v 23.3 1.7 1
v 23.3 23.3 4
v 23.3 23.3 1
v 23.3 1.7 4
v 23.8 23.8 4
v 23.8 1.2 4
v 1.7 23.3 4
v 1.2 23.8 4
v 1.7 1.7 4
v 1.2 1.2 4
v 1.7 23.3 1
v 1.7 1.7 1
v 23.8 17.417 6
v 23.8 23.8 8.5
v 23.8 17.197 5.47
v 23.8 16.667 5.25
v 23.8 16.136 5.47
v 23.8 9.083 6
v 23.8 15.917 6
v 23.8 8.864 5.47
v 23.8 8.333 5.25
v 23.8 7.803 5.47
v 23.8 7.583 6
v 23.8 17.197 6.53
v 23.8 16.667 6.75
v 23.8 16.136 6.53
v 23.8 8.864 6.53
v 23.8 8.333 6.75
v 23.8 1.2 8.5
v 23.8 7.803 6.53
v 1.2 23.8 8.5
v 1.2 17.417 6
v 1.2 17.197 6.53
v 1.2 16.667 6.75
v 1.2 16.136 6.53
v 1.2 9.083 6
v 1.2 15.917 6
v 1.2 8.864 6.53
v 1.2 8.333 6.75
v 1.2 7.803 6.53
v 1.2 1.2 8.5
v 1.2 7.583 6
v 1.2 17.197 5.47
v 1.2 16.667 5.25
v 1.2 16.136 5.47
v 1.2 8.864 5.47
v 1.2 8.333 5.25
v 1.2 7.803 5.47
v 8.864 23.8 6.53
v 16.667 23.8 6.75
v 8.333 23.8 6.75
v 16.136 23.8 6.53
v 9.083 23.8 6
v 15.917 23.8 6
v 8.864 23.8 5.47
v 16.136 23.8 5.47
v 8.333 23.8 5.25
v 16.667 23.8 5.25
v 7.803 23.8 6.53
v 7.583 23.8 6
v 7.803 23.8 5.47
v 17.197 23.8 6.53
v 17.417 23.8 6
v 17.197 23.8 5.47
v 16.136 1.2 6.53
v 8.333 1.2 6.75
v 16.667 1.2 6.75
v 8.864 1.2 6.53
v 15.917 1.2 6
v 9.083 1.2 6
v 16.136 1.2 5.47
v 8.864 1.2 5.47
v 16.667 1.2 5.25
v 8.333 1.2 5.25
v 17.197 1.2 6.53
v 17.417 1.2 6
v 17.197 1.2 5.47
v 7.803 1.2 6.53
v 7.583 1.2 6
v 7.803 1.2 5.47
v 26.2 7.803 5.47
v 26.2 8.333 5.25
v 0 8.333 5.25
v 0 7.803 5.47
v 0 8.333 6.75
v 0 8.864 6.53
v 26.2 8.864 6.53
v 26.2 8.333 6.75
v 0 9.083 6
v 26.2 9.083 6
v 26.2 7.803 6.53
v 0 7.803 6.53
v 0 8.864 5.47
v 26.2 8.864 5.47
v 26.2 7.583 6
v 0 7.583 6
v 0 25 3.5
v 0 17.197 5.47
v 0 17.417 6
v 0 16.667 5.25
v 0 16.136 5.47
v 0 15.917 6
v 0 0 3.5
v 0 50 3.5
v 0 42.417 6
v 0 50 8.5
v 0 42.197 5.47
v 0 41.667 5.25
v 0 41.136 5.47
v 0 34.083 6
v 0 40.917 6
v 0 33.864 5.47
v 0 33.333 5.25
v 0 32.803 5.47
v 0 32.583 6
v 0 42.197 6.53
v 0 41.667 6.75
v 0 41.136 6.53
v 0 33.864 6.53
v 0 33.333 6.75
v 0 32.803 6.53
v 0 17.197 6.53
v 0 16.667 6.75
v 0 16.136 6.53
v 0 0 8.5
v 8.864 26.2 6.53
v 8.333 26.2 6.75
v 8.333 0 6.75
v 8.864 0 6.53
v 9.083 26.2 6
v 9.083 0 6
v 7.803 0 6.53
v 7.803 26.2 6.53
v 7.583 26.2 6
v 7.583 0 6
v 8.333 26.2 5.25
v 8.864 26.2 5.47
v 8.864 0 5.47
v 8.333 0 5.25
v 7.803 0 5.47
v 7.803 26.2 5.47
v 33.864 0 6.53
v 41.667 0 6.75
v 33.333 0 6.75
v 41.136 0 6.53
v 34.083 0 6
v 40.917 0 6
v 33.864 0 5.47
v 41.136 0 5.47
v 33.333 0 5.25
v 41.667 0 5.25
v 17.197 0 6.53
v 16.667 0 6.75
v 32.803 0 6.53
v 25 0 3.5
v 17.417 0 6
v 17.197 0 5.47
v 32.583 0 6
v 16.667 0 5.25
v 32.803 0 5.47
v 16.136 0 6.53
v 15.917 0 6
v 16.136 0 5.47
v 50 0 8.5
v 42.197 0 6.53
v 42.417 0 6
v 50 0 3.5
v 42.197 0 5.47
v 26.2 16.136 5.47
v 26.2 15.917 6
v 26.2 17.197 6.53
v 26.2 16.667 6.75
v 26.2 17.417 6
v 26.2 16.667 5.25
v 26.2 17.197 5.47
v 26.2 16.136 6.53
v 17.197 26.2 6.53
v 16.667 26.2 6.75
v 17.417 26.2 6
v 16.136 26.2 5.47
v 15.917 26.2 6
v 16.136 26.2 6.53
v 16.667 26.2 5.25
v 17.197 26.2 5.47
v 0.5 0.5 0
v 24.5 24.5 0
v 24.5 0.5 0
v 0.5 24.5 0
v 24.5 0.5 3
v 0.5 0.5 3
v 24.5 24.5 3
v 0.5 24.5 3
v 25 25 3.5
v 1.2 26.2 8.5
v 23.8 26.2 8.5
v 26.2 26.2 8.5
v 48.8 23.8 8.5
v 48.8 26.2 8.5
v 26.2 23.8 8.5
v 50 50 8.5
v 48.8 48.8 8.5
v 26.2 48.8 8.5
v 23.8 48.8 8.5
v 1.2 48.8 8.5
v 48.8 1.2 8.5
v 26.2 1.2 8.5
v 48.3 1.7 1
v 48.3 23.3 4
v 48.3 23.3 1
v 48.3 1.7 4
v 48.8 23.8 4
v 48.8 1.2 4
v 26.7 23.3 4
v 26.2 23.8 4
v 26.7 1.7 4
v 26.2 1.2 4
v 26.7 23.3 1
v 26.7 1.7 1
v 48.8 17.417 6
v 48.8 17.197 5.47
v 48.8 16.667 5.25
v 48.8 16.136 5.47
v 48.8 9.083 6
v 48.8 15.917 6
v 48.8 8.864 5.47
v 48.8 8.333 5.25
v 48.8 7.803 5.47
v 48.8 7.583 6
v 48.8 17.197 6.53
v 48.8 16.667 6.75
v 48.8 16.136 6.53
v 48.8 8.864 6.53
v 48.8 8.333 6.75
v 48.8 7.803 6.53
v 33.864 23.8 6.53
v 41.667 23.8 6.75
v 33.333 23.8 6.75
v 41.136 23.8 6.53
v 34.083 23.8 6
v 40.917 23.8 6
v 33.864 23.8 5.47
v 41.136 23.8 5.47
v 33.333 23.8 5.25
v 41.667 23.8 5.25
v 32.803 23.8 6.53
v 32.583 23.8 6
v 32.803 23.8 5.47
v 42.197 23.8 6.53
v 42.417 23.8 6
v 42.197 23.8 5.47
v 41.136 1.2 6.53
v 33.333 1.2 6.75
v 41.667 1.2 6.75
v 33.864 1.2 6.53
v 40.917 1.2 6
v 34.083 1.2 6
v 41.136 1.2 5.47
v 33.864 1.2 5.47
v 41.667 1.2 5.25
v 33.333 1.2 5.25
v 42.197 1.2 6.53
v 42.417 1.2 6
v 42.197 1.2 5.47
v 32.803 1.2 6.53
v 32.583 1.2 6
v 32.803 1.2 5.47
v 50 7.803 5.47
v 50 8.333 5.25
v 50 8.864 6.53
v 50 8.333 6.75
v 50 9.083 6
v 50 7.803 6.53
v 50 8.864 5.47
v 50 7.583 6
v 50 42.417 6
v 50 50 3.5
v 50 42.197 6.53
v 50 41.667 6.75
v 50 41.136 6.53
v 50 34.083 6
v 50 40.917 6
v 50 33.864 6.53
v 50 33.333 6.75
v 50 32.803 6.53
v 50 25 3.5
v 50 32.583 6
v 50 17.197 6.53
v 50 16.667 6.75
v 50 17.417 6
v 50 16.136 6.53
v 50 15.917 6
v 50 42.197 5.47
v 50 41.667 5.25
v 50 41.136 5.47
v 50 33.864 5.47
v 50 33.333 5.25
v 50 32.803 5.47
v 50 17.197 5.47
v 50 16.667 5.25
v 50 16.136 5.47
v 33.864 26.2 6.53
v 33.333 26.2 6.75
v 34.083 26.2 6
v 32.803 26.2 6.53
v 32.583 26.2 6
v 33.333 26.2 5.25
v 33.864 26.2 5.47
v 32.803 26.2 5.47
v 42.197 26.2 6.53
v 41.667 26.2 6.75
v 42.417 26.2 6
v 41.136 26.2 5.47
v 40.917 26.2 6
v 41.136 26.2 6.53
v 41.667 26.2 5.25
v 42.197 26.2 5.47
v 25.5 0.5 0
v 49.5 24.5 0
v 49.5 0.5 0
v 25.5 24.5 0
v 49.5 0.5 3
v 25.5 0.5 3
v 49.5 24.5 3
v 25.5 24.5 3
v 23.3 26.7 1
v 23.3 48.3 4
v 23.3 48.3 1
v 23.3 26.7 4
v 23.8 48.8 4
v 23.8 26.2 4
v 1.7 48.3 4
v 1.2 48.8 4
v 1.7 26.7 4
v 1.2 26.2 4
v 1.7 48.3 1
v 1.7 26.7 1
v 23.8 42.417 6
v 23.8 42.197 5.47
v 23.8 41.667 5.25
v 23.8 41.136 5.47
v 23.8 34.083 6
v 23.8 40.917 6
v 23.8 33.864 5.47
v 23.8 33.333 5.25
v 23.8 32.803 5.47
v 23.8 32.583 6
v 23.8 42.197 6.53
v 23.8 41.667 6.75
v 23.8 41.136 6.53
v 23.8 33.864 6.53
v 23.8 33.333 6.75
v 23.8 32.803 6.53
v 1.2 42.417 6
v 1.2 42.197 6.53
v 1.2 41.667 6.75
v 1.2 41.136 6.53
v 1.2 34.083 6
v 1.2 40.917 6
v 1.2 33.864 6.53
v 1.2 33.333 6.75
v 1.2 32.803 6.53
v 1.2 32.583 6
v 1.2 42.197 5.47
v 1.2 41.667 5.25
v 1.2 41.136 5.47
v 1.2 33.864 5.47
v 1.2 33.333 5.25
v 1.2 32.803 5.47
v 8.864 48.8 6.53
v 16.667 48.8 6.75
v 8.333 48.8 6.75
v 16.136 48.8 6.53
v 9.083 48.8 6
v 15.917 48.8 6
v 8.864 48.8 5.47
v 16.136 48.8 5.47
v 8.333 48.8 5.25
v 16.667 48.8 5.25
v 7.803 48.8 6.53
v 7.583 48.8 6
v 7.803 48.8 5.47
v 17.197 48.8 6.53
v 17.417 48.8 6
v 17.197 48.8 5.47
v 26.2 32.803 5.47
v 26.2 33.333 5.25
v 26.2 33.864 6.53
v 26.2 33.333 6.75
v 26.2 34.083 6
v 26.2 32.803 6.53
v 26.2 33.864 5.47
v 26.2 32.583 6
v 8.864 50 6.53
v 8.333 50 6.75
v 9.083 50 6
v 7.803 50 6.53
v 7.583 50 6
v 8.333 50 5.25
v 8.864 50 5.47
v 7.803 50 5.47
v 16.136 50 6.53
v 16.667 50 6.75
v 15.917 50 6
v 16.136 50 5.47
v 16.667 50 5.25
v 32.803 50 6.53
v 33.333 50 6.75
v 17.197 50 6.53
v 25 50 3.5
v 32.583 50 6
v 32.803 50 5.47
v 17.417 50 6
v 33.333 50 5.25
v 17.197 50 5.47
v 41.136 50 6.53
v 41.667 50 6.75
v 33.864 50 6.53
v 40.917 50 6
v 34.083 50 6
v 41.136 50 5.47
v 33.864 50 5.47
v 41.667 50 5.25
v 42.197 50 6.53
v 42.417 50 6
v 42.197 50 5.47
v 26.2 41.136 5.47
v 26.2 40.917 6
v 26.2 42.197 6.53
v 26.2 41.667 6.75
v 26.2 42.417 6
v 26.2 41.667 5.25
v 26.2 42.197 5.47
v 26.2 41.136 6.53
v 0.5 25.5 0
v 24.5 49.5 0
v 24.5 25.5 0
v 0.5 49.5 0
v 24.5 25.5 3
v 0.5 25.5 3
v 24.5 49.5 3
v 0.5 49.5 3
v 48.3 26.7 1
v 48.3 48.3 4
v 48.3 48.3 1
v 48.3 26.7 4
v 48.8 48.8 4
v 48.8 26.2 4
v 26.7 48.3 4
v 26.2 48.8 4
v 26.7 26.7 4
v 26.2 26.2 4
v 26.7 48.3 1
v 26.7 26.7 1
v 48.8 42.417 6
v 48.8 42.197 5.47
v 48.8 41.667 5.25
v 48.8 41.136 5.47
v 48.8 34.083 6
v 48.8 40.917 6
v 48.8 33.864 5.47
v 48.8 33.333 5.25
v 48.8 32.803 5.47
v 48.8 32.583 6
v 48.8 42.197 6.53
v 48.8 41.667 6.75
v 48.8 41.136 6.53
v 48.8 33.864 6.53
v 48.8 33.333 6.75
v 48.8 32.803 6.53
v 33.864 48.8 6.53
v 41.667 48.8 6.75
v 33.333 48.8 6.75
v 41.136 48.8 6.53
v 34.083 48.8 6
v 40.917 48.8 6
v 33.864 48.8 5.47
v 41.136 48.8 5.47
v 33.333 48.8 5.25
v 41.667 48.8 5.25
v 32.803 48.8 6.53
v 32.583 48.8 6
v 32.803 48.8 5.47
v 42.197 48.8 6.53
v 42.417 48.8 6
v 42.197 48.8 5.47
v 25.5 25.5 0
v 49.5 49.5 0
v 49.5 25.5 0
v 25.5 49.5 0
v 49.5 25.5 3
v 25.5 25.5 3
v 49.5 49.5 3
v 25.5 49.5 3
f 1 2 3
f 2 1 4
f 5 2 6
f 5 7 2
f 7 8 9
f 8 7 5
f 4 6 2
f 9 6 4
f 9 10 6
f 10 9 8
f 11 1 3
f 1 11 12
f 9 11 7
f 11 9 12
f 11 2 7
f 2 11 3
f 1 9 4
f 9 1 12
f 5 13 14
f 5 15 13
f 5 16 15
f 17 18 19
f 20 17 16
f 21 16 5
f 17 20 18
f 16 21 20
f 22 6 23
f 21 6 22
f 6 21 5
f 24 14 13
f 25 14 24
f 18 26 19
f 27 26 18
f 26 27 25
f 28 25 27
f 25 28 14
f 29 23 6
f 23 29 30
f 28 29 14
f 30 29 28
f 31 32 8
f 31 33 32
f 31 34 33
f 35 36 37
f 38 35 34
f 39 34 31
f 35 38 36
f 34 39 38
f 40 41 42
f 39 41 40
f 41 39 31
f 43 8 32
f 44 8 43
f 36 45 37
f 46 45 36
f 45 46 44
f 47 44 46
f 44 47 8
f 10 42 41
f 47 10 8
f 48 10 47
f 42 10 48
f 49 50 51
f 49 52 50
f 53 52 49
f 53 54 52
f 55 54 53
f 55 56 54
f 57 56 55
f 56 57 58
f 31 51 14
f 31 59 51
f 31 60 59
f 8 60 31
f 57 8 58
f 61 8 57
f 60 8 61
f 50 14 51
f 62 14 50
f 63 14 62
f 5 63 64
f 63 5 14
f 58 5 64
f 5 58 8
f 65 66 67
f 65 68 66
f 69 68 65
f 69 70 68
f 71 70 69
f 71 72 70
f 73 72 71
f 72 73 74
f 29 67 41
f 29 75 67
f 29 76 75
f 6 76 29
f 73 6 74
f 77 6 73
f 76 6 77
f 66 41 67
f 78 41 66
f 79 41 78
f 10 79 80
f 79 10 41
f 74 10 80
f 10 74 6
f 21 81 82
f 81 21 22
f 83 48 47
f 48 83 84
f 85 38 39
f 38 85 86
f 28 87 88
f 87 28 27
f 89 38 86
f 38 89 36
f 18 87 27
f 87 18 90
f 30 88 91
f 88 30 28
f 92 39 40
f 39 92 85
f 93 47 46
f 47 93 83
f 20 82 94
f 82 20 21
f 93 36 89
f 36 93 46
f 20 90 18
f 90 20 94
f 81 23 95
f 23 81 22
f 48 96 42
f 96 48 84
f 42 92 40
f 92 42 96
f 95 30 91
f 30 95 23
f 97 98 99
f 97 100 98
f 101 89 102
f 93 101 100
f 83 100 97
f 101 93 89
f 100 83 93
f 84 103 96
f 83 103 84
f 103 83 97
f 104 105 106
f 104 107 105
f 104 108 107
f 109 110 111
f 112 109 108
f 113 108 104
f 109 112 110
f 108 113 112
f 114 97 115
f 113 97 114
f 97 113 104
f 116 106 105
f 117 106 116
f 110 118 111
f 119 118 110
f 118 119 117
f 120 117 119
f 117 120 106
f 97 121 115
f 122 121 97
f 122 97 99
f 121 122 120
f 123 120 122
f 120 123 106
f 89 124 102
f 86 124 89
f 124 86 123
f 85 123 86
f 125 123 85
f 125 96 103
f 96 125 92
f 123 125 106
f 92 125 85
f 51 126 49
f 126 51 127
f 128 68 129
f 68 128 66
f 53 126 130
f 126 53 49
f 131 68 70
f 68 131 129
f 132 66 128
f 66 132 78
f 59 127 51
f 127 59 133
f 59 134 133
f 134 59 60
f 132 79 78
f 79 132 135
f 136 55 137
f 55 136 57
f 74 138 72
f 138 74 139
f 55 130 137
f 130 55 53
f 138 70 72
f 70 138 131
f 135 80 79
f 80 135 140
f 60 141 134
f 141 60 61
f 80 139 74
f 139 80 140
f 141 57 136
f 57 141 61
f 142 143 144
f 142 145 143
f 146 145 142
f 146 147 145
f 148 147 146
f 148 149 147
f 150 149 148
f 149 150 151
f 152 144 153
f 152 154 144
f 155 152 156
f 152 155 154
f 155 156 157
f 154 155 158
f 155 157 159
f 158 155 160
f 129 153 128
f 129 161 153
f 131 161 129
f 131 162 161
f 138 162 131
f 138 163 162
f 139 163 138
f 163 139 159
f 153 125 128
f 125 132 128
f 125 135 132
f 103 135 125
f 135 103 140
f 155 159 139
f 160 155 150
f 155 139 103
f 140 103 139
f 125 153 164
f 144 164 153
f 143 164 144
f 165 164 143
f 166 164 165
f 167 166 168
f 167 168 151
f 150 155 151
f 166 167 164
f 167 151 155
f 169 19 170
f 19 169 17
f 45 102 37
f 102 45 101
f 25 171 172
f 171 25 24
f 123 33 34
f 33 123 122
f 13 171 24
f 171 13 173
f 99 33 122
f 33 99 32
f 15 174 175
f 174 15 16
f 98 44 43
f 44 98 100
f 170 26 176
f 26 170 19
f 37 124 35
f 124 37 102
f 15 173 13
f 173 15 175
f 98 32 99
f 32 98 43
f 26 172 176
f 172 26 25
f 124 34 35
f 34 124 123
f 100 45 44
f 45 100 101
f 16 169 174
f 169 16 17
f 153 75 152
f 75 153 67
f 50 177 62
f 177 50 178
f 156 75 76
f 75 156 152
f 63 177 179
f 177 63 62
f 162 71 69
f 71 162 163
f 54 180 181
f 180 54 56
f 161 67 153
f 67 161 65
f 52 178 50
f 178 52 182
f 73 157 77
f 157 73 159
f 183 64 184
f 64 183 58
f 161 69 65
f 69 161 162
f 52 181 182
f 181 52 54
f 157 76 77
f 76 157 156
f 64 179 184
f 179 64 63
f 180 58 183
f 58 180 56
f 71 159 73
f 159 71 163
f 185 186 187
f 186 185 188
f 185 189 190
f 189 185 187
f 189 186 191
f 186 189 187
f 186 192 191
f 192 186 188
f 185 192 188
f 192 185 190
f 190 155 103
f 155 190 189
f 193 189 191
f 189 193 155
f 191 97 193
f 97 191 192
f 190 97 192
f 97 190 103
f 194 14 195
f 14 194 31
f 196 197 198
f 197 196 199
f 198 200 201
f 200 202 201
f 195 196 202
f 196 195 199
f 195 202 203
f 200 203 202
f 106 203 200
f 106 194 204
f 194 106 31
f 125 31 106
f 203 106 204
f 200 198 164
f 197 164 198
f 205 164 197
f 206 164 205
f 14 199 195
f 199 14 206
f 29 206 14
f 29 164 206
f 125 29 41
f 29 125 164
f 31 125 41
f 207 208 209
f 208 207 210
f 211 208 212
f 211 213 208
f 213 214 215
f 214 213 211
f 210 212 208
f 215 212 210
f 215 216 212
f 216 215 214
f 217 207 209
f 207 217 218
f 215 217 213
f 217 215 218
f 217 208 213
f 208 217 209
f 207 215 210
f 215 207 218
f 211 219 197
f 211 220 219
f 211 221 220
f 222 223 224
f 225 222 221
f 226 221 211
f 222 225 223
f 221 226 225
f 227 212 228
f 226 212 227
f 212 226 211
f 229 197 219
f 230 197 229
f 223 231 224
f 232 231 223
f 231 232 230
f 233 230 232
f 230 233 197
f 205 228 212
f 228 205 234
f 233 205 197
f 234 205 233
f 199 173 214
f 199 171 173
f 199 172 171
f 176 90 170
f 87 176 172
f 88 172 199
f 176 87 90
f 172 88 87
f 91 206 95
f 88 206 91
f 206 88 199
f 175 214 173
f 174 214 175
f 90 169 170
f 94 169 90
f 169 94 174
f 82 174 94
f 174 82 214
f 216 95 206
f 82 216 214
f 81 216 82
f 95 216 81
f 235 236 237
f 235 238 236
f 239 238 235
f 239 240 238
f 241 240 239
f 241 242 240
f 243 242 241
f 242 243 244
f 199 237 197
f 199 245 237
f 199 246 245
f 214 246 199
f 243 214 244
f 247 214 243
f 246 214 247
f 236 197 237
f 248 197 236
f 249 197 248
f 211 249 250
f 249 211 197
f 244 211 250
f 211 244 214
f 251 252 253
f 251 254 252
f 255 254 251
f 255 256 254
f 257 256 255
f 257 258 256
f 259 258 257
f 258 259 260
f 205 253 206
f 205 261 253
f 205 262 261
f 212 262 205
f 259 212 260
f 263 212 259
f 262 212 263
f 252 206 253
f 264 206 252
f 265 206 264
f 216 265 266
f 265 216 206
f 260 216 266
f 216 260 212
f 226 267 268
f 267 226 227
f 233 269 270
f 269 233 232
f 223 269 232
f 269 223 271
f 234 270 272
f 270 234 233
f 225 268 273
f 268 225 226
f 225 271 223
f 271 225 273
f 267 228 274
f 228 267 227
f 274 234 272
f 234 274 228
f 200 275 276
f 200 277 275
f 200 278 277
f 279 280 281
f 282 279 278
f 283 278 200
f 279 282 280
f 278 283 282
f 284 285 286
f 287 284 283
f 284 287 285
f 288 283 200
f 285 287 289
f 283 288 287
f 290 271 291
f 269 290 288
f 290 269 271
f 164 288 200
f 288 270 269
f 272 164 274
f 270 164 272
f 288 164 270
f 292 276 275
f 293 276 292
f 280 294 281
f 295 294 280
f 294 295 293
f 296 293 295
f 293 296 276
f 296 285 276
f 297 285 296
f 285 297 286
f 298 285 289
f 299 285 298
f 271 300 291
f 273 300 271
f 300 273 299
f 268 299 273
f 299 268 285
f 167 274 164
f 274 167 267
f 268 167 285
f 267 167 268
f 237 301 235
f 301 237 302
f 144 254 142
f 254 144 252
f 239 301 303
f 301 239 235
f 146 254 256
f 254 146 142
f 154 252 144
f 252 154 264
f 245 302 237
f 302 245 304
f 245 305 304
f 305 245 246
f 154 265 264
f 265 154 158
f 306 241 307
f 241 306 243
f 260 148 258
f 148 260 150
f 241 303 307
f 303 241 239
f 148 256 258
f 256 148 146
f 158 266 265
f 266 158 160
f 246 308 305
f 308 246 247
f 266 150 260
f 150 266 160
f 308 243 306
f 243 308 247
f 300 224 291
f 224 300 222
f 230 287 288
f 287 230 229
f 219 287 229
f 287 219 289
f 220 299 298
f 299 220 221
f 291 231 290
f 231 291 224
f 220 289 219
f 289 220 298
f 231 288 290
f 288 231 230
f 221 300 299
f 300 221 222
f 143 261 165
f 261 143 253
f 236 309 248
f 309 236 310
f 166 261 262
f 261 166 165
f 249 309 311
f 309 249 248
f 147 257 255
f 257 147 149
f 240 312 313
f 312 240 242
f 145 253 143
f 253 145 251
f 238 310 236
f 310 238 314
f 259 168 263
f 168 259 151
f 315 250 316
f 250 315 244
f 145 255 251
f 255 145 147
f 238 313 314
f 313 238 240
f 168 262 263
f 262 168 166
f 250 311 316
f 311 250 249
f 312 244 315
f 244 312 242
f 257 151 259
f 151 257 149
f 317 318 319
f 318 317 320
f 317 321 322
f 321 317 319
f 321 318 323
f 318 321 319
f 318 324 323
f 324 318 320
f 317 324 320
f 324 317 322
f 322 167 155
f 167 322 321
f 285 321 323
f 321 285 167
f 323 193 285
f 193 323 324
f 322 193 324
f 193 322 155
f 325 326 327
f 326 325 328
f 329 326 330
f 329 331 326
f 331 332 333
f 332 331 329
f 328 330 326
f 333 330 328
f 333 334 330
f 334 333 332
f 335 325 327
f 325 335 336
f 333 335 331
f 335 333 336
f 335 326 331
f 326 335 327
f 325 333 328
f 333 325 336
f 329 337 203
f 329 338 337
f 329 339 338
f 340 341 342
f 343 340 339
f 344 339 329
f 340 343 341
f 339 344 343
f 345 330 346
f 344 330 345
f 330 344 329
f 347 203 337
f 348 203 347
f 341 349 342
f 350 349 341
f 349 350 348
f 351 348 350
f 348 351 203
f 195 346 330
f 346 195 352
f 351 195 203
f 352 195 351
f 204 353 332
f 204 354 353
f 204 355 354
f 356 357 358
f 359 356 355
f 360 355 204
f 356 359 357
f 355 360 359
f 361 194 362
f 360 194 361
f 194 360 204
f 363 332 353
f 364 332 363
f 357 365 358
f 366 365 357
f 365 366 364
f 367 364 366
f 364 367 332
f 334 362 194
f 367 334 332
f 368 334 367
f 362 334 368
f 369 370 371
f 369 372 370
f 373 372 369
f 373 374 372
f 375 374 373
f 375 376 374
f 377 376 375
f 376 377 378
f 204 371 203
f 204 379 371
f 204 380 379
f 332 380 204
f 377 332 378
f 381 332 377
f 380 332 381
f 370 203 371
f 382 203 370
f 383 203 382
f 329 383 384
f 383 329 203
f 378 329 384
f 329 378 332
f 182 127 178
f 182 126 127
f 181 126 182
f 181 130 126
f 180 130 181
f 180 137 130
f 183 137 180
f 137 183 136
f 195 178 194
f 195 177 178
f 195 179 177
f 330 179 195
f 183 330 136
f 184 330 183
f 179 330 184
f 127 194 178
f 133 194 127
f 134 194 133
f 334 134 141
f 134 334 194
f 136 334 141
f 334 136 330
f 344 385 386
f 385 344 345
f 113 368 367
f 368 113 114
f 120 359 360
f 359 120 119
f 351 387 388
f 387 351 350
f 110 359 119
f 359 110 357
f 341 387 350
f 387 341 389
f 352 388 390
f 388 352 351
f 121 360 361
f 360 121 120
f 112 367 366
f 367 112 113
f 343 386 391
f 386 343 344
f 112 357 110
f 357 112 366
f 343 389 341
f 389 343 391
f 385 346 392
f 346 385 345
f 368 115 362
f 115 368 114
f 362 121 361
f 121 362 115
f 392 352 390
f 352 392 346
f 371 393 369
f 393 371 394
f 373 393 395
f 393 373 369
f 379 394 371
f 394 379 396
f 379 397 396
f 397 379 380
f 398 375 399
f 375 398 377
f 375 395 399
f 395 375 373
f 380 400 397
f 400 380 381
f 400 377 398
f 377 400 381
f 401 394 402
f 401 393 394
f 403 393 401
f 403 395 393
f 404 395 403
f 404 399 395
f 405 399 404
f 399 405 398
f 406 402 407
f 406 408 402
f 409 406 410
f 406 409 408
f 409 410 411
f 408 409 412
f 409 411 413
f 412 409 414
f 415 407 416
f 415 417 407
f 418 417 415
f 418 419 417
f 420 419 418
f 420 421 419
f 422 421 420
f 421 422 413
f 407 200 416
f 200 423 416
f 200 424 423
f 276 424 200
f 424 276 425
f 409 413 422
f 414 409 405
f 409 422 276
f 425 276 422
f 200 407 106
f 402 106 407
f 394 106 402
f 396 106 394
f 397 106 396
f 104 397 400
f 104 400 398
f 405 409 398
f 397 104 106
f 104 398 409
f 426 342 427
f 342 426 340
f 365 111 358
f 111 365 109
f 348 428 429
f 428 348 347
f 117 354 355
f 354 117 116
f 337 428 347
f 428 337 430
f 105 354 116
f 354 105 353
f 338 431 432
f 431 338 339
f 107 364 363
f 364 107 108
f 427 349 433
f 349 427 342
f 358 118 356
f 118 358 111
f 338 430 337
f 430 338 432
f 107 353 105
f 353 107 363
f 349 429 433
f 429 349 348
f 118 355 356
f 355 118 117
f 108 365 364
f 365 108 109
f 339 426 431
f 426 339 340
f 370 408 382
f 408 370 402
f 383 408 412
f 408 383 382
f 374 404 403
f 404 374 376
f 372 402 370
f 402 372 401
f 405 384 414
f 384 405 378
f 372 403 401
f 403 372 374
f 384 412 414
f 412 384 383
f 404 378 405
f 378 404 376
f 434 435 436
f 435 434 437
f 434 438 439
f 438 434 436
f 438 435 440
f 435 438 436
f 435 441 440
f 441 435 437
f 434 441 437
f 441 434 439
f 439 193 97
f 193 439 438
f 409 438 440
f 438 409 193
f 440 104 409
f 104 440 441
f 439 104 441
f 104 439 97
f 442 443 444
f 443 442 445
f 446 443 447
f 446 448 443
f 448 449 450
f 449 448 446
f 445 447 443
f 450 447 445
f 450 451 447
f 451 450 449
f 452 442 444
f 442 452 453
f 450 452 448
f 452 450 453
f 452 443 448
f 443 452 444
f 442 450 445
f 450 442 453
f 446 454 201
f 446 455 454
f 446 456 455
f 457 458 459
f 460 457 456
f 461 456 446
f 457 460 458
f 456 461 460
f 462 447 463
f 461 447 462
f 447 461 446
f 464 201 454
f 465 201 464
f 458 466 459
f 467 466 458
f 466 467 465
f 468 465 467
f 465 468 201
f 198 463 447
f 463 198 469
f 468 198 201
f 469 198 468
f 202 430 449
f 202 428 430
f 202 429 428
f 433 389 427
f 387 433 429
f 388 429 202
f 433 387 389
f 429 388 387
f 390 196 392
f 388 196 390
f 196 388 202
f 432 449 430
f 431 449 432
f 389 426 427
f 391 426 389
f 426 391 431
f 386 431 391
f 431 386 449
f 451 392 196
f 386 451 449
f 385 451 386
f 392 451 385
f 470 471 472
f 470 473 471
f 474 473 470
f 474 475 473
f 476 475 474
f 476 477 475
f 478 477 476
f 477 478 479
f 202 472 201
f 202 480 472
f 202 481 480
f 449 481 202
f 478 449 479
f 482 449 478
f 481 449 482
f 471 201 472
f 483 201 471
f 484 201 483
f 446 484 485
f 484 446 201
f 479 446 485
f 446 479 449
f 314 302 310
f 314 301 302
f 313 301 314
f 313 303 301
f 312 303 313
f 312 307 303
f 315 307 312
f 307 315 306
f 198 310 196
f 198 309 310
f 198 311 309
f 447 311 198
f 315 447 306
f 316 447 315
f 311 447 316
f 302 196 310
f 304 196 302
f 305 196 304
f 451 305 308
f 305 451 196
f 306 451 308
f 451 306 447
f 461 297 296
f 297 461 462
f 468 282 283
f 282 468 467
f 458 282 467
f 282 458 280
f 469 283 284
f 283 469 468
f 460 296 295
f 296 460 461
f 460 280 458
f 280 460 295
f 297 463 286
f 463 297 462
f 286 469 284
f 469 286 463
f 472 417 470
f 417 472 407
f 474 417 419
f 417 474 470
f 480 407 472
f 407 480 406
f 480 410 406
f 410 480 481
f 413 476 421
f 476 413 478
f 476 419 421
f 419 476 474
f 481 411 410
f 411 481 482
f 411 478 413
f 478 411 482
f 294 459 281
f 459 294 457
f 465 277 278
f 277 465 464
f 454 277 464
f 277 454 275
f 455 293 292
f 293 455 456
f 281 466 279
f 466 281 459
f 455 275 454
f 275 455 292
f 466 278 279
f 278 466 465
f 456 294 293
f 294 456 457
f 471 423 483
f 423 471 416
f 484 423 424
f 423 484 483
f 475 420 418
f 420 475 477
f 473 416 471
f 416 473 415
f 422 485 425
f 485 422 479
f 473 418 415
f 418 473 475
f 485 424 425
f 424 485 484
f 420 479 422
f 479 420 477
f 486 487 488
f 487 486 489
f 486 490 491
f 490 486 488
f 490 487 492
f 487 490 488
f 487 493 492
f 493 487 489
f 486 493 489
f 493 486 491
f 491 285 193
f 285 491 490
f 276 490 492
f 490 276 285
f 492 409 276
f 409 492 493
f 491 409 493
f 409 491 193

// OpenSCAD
// Version 1.2



// Tile sizes of 25 are standard for most open tile bases
tilewidth = 25;
tiledepth = 25;

// Tile height is the height of each indiviual tile stone
tileheight = 3;
// Base height is the height from chamfer to table
baseheight = 5;

// Gap defines the space between each tile stone
gap = 1;



// Use cols and rows to define simple stone layouts
cols = 2;
rows = 2;

// Use a tileset of vectors to define a unique layout shape
tileset = [];
//tileset = [[0,0],[0,1],[0,2],[1,2],[2,2],[2,1],[2,0]];



// Cutouts uf you want to remove the top(bottom? and keep your bases clean
cutouts = true;
// The distance of the walls on the inside, 1.2 will work great with most 0.4 printer nozzles
wallsize = 1.2;
// Topsize ironically is the part that prints against the bed
topsize = 1;



// Use threadholes if you want to connect your tilesets together
threadholes = 2; // [0:0,1:1,2:2,3:3,4:4]
threadholesize = 0.75;











module pyramid(w,d,h,ch) {
    
    difference(){
    polyhedron(
    points=[
        [0,0,0],
        [w,0,0],
        [w,d,0],
        [0,d,0],
        [w*0.5,d*0.5,h]
    ],
    faces=[
        [0,1,2,3],
        [0,4,1],
        [1,4,2],
        [2,4,3],
        [3,4,0]
    ]
    );
    translate([0,0,ch])
    cube([w,d,h]);
    }
}

//rotate([180,0,0])
//translate([0,-50,-5])
//pyramid(50,50,25,5);


module newtile(w,d,h,g,b){
    hg = g*0.5;
    difference(){
        polyhedron
        (points = [
            [hg, hg, 0], // 0
            [w-hg, hg, 0], // 1
            [w-hg, d-hg, 0], // 2
            [hg, d-hg, 0], // 3
        
            [hg, hg, h], // 4
            [w-hg, hg, h], // 5
            [w-hg, d-hg, h], // 6
            [hg, d-hg, h], // 7
        
            [0, 0, h+hg], // 8
            [w, 0, h+hg], // 9
            [w, d, h+hg], // 10
            [0, d, h+hg], // 11
        
            [0, 0, h+b+hg], // 12
            [w, 0, h+b+hg], // 13
            [w, d, h+b+hg], // 14
            [0, d, h+b+hg] // 15
        ], 
        faces = [
            [0,1,2,3],
            [0,4,5,1],
            [1,5,6,2],
            [2,6,7,3],
            [3,7,4,0],
            [4,8,9,5],
            [5,9,10,6],
            [6,10,11,7],
            [7,11,8,4],
            [8,12,13,9],
            [9,13,14,10],
            [10,14,15,11],
            [11,15,12,8],
            [12,15,14,13]
        ]);
        if(cutouts) {
            translate([wallsize+hg,wallsize+hg,topsize])
            cube([w-g-wallsize*2,d-g-wallsize*2,h]);
             
            translate([wallsize,wallsize,h+g])
            cube([w-wallsize*2,d-wallsize*2,h+b+hg+topsize]);
        }
        if(threadholes>0){
            threadcount = threadholes+1;
            for(i=[1:threadholes]) {
                translate([w*0.5,d*(i/threadcount),h+hg+b*0.5])
                rotate([90,0,90])
                cylinder(
                    r1=threadholesize,
                    r2=threadholesize,
                    h=w,
                    $fn=8,
                    center=true
                );
                translate([w*(i/threadcount),d*0.5,h+hg+b*0.5])
                rotate([90,0,0])
                cylinder(
                    r1=threadholesize,
                    r2=threadholesize,
                    h=d,
                    $fn=8,
                    center=true
                );
            }
        }
    }
}

module tilegroup(p=[]) {
    if(len(p)==0)
        for(i = [0:cols*rows-1]) {
            tileat((i%cols),floor(i/cols));
        }
    else 
        for(i = [0:len(p)-1]) {
            tileat(p[i][0],p[i][1]);
        }
}

module tileat(x,y) {
    translate([tilewidth*x,tiledepth*y,0])
    newtile(
        tilewidth,
        tiledepth,
        tileheight,
        gap,
        baseheight
    );
}

tilegroup(tileset);
